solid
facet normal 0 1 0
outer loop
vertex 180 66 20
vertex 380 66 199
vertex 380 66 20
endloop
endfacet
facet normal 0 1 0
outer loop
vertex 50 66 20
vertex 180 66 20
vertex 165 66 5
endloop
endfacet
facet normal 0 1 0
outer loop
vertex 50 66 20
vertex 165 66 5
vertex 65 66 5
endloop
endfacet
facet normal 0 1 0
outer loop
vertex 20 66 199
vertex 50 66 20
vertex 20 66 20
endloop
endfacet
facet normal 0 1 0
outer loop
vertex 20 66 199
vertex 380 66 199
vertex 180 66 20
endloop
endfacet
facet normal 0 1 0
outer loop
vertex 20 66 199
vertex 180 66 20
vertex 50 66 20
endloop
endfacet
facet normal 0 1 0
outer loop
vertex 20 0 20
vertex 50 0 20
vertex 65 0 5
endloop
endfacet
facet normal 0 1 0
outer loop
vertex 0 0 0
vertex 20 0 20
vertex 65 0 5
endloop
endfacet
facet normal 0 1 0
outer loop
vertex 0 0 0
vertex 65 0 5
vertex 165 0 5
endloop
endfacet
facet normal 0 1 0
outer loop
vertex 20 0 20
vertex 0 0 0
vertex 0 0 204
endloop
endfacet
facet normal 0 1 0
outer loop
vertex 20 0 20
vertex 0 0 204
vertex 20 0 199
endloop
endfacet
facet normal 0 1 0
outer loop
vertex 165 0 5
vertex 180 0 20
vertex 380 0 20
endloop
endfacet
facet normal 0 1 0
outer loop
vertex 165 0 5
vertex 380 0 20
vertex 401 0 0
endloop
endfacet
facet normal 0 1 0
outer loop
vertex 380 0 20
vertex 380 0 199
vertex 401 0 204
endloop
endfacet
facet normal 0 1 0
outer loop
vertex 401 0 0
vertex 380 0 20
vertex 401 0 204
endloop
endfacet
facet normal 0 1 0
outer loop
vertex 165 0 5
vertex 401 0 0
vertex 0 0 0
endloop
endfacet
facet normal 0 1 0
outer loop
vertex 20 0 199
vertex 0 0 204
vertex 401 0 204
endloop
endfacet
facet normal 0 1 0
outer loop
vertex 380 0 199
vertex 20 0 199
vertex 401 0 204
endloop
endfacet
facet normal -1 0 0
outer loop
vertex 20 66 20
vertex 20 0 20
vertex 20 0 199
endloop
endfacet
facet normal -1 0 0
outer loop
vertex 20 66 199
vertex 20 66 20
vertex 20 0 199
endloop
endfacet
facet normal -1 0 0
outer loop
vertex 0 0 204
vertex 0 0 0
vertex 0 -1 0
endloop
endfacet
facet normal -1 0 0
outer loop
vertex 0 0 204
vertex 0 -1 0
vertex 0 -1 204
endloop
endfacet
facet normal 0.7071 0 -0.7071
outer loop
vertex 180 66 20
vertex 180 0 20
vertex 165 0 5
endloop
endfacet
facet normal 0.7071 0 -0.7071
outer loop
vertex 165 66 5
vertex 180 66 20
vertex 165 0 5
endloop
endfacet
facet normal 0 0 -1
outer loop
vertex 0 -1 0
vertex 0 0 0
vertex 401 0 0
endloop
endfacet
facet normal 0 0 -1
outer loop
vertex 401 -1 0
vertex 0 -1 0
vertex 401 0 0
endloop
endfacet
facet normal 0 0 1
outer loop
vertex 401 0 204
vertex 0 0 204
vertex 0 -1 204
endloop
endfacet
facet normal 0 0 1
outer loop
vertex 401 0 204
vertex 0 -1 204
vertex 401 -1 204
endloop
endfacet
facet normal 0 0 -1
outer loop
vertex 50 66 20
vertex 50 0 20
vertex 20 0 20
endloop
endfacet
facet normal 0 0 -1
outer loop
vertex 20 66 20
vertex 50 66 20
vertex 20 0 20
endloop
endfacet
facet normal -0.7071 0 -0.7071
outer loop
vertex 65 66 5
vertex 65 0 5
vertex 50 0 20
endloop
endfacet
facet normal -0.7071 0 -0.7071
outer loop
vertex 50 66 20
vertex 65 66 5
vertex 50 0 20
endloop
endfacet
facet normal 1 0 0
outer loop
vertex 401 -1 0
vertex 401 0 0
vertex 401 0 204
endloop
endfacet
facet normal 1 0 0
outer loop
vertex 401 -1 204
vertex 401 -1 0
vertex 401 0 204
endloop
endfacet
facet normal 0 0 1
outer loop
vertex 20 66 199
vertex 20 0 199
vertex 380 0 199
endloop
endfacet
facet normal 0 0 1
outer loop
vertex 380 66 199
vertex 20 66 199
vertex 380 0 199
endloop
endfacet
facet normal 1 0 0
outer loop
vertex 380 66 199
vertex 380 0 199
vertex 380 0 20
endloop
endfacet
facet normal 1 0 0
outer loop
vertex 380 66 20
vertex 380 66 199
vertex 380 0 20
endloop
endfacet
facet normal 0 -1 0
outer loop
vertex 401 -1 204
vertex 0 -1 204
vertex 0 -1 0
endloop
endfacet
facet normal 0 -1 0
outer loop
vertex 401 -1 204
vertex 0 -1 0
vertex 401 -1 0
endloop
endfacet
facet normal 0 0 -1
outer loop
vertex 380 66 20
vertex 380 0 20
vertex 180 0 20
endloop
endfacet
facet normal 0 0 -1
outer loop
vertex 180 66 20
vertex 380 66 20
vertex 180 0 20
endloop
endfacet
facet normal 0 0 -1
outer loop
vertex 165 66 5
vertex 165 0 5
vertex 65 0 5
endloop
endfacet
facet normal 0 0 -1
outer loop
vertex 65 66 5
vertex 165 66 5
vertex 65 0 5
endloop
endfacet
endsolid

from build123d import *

# Parameters (mm, degrees)
F0_W     = 401
F0_H     = 204
F1_DEPTH = 1
F3_DEPTH = 66


with BuildPart() as f1:
    # F0 (on Front) → F1 (new body)
    with BuildSketch(Plane.XZ):
        with Locations((200.5, 102)):
            Rectangle(F0_W, F0_H)
    extrude(amount=F1_DEPTH)

    # F2 (on face) → F3 (join)
    with BuildSketch(Plane(origin=(0, 0, 0), x_dir=(-1, 0, 0), z_dir=(0, 1, 0))):
        Polygon((-20, 20), (-20, 199), (-380, 199), (-380, 20), (-180, 20), (-165, 5), (-65, 5), (-50, 20), align=None)
    extrude(amount=F3_DEPTH)


solid = f1.part
